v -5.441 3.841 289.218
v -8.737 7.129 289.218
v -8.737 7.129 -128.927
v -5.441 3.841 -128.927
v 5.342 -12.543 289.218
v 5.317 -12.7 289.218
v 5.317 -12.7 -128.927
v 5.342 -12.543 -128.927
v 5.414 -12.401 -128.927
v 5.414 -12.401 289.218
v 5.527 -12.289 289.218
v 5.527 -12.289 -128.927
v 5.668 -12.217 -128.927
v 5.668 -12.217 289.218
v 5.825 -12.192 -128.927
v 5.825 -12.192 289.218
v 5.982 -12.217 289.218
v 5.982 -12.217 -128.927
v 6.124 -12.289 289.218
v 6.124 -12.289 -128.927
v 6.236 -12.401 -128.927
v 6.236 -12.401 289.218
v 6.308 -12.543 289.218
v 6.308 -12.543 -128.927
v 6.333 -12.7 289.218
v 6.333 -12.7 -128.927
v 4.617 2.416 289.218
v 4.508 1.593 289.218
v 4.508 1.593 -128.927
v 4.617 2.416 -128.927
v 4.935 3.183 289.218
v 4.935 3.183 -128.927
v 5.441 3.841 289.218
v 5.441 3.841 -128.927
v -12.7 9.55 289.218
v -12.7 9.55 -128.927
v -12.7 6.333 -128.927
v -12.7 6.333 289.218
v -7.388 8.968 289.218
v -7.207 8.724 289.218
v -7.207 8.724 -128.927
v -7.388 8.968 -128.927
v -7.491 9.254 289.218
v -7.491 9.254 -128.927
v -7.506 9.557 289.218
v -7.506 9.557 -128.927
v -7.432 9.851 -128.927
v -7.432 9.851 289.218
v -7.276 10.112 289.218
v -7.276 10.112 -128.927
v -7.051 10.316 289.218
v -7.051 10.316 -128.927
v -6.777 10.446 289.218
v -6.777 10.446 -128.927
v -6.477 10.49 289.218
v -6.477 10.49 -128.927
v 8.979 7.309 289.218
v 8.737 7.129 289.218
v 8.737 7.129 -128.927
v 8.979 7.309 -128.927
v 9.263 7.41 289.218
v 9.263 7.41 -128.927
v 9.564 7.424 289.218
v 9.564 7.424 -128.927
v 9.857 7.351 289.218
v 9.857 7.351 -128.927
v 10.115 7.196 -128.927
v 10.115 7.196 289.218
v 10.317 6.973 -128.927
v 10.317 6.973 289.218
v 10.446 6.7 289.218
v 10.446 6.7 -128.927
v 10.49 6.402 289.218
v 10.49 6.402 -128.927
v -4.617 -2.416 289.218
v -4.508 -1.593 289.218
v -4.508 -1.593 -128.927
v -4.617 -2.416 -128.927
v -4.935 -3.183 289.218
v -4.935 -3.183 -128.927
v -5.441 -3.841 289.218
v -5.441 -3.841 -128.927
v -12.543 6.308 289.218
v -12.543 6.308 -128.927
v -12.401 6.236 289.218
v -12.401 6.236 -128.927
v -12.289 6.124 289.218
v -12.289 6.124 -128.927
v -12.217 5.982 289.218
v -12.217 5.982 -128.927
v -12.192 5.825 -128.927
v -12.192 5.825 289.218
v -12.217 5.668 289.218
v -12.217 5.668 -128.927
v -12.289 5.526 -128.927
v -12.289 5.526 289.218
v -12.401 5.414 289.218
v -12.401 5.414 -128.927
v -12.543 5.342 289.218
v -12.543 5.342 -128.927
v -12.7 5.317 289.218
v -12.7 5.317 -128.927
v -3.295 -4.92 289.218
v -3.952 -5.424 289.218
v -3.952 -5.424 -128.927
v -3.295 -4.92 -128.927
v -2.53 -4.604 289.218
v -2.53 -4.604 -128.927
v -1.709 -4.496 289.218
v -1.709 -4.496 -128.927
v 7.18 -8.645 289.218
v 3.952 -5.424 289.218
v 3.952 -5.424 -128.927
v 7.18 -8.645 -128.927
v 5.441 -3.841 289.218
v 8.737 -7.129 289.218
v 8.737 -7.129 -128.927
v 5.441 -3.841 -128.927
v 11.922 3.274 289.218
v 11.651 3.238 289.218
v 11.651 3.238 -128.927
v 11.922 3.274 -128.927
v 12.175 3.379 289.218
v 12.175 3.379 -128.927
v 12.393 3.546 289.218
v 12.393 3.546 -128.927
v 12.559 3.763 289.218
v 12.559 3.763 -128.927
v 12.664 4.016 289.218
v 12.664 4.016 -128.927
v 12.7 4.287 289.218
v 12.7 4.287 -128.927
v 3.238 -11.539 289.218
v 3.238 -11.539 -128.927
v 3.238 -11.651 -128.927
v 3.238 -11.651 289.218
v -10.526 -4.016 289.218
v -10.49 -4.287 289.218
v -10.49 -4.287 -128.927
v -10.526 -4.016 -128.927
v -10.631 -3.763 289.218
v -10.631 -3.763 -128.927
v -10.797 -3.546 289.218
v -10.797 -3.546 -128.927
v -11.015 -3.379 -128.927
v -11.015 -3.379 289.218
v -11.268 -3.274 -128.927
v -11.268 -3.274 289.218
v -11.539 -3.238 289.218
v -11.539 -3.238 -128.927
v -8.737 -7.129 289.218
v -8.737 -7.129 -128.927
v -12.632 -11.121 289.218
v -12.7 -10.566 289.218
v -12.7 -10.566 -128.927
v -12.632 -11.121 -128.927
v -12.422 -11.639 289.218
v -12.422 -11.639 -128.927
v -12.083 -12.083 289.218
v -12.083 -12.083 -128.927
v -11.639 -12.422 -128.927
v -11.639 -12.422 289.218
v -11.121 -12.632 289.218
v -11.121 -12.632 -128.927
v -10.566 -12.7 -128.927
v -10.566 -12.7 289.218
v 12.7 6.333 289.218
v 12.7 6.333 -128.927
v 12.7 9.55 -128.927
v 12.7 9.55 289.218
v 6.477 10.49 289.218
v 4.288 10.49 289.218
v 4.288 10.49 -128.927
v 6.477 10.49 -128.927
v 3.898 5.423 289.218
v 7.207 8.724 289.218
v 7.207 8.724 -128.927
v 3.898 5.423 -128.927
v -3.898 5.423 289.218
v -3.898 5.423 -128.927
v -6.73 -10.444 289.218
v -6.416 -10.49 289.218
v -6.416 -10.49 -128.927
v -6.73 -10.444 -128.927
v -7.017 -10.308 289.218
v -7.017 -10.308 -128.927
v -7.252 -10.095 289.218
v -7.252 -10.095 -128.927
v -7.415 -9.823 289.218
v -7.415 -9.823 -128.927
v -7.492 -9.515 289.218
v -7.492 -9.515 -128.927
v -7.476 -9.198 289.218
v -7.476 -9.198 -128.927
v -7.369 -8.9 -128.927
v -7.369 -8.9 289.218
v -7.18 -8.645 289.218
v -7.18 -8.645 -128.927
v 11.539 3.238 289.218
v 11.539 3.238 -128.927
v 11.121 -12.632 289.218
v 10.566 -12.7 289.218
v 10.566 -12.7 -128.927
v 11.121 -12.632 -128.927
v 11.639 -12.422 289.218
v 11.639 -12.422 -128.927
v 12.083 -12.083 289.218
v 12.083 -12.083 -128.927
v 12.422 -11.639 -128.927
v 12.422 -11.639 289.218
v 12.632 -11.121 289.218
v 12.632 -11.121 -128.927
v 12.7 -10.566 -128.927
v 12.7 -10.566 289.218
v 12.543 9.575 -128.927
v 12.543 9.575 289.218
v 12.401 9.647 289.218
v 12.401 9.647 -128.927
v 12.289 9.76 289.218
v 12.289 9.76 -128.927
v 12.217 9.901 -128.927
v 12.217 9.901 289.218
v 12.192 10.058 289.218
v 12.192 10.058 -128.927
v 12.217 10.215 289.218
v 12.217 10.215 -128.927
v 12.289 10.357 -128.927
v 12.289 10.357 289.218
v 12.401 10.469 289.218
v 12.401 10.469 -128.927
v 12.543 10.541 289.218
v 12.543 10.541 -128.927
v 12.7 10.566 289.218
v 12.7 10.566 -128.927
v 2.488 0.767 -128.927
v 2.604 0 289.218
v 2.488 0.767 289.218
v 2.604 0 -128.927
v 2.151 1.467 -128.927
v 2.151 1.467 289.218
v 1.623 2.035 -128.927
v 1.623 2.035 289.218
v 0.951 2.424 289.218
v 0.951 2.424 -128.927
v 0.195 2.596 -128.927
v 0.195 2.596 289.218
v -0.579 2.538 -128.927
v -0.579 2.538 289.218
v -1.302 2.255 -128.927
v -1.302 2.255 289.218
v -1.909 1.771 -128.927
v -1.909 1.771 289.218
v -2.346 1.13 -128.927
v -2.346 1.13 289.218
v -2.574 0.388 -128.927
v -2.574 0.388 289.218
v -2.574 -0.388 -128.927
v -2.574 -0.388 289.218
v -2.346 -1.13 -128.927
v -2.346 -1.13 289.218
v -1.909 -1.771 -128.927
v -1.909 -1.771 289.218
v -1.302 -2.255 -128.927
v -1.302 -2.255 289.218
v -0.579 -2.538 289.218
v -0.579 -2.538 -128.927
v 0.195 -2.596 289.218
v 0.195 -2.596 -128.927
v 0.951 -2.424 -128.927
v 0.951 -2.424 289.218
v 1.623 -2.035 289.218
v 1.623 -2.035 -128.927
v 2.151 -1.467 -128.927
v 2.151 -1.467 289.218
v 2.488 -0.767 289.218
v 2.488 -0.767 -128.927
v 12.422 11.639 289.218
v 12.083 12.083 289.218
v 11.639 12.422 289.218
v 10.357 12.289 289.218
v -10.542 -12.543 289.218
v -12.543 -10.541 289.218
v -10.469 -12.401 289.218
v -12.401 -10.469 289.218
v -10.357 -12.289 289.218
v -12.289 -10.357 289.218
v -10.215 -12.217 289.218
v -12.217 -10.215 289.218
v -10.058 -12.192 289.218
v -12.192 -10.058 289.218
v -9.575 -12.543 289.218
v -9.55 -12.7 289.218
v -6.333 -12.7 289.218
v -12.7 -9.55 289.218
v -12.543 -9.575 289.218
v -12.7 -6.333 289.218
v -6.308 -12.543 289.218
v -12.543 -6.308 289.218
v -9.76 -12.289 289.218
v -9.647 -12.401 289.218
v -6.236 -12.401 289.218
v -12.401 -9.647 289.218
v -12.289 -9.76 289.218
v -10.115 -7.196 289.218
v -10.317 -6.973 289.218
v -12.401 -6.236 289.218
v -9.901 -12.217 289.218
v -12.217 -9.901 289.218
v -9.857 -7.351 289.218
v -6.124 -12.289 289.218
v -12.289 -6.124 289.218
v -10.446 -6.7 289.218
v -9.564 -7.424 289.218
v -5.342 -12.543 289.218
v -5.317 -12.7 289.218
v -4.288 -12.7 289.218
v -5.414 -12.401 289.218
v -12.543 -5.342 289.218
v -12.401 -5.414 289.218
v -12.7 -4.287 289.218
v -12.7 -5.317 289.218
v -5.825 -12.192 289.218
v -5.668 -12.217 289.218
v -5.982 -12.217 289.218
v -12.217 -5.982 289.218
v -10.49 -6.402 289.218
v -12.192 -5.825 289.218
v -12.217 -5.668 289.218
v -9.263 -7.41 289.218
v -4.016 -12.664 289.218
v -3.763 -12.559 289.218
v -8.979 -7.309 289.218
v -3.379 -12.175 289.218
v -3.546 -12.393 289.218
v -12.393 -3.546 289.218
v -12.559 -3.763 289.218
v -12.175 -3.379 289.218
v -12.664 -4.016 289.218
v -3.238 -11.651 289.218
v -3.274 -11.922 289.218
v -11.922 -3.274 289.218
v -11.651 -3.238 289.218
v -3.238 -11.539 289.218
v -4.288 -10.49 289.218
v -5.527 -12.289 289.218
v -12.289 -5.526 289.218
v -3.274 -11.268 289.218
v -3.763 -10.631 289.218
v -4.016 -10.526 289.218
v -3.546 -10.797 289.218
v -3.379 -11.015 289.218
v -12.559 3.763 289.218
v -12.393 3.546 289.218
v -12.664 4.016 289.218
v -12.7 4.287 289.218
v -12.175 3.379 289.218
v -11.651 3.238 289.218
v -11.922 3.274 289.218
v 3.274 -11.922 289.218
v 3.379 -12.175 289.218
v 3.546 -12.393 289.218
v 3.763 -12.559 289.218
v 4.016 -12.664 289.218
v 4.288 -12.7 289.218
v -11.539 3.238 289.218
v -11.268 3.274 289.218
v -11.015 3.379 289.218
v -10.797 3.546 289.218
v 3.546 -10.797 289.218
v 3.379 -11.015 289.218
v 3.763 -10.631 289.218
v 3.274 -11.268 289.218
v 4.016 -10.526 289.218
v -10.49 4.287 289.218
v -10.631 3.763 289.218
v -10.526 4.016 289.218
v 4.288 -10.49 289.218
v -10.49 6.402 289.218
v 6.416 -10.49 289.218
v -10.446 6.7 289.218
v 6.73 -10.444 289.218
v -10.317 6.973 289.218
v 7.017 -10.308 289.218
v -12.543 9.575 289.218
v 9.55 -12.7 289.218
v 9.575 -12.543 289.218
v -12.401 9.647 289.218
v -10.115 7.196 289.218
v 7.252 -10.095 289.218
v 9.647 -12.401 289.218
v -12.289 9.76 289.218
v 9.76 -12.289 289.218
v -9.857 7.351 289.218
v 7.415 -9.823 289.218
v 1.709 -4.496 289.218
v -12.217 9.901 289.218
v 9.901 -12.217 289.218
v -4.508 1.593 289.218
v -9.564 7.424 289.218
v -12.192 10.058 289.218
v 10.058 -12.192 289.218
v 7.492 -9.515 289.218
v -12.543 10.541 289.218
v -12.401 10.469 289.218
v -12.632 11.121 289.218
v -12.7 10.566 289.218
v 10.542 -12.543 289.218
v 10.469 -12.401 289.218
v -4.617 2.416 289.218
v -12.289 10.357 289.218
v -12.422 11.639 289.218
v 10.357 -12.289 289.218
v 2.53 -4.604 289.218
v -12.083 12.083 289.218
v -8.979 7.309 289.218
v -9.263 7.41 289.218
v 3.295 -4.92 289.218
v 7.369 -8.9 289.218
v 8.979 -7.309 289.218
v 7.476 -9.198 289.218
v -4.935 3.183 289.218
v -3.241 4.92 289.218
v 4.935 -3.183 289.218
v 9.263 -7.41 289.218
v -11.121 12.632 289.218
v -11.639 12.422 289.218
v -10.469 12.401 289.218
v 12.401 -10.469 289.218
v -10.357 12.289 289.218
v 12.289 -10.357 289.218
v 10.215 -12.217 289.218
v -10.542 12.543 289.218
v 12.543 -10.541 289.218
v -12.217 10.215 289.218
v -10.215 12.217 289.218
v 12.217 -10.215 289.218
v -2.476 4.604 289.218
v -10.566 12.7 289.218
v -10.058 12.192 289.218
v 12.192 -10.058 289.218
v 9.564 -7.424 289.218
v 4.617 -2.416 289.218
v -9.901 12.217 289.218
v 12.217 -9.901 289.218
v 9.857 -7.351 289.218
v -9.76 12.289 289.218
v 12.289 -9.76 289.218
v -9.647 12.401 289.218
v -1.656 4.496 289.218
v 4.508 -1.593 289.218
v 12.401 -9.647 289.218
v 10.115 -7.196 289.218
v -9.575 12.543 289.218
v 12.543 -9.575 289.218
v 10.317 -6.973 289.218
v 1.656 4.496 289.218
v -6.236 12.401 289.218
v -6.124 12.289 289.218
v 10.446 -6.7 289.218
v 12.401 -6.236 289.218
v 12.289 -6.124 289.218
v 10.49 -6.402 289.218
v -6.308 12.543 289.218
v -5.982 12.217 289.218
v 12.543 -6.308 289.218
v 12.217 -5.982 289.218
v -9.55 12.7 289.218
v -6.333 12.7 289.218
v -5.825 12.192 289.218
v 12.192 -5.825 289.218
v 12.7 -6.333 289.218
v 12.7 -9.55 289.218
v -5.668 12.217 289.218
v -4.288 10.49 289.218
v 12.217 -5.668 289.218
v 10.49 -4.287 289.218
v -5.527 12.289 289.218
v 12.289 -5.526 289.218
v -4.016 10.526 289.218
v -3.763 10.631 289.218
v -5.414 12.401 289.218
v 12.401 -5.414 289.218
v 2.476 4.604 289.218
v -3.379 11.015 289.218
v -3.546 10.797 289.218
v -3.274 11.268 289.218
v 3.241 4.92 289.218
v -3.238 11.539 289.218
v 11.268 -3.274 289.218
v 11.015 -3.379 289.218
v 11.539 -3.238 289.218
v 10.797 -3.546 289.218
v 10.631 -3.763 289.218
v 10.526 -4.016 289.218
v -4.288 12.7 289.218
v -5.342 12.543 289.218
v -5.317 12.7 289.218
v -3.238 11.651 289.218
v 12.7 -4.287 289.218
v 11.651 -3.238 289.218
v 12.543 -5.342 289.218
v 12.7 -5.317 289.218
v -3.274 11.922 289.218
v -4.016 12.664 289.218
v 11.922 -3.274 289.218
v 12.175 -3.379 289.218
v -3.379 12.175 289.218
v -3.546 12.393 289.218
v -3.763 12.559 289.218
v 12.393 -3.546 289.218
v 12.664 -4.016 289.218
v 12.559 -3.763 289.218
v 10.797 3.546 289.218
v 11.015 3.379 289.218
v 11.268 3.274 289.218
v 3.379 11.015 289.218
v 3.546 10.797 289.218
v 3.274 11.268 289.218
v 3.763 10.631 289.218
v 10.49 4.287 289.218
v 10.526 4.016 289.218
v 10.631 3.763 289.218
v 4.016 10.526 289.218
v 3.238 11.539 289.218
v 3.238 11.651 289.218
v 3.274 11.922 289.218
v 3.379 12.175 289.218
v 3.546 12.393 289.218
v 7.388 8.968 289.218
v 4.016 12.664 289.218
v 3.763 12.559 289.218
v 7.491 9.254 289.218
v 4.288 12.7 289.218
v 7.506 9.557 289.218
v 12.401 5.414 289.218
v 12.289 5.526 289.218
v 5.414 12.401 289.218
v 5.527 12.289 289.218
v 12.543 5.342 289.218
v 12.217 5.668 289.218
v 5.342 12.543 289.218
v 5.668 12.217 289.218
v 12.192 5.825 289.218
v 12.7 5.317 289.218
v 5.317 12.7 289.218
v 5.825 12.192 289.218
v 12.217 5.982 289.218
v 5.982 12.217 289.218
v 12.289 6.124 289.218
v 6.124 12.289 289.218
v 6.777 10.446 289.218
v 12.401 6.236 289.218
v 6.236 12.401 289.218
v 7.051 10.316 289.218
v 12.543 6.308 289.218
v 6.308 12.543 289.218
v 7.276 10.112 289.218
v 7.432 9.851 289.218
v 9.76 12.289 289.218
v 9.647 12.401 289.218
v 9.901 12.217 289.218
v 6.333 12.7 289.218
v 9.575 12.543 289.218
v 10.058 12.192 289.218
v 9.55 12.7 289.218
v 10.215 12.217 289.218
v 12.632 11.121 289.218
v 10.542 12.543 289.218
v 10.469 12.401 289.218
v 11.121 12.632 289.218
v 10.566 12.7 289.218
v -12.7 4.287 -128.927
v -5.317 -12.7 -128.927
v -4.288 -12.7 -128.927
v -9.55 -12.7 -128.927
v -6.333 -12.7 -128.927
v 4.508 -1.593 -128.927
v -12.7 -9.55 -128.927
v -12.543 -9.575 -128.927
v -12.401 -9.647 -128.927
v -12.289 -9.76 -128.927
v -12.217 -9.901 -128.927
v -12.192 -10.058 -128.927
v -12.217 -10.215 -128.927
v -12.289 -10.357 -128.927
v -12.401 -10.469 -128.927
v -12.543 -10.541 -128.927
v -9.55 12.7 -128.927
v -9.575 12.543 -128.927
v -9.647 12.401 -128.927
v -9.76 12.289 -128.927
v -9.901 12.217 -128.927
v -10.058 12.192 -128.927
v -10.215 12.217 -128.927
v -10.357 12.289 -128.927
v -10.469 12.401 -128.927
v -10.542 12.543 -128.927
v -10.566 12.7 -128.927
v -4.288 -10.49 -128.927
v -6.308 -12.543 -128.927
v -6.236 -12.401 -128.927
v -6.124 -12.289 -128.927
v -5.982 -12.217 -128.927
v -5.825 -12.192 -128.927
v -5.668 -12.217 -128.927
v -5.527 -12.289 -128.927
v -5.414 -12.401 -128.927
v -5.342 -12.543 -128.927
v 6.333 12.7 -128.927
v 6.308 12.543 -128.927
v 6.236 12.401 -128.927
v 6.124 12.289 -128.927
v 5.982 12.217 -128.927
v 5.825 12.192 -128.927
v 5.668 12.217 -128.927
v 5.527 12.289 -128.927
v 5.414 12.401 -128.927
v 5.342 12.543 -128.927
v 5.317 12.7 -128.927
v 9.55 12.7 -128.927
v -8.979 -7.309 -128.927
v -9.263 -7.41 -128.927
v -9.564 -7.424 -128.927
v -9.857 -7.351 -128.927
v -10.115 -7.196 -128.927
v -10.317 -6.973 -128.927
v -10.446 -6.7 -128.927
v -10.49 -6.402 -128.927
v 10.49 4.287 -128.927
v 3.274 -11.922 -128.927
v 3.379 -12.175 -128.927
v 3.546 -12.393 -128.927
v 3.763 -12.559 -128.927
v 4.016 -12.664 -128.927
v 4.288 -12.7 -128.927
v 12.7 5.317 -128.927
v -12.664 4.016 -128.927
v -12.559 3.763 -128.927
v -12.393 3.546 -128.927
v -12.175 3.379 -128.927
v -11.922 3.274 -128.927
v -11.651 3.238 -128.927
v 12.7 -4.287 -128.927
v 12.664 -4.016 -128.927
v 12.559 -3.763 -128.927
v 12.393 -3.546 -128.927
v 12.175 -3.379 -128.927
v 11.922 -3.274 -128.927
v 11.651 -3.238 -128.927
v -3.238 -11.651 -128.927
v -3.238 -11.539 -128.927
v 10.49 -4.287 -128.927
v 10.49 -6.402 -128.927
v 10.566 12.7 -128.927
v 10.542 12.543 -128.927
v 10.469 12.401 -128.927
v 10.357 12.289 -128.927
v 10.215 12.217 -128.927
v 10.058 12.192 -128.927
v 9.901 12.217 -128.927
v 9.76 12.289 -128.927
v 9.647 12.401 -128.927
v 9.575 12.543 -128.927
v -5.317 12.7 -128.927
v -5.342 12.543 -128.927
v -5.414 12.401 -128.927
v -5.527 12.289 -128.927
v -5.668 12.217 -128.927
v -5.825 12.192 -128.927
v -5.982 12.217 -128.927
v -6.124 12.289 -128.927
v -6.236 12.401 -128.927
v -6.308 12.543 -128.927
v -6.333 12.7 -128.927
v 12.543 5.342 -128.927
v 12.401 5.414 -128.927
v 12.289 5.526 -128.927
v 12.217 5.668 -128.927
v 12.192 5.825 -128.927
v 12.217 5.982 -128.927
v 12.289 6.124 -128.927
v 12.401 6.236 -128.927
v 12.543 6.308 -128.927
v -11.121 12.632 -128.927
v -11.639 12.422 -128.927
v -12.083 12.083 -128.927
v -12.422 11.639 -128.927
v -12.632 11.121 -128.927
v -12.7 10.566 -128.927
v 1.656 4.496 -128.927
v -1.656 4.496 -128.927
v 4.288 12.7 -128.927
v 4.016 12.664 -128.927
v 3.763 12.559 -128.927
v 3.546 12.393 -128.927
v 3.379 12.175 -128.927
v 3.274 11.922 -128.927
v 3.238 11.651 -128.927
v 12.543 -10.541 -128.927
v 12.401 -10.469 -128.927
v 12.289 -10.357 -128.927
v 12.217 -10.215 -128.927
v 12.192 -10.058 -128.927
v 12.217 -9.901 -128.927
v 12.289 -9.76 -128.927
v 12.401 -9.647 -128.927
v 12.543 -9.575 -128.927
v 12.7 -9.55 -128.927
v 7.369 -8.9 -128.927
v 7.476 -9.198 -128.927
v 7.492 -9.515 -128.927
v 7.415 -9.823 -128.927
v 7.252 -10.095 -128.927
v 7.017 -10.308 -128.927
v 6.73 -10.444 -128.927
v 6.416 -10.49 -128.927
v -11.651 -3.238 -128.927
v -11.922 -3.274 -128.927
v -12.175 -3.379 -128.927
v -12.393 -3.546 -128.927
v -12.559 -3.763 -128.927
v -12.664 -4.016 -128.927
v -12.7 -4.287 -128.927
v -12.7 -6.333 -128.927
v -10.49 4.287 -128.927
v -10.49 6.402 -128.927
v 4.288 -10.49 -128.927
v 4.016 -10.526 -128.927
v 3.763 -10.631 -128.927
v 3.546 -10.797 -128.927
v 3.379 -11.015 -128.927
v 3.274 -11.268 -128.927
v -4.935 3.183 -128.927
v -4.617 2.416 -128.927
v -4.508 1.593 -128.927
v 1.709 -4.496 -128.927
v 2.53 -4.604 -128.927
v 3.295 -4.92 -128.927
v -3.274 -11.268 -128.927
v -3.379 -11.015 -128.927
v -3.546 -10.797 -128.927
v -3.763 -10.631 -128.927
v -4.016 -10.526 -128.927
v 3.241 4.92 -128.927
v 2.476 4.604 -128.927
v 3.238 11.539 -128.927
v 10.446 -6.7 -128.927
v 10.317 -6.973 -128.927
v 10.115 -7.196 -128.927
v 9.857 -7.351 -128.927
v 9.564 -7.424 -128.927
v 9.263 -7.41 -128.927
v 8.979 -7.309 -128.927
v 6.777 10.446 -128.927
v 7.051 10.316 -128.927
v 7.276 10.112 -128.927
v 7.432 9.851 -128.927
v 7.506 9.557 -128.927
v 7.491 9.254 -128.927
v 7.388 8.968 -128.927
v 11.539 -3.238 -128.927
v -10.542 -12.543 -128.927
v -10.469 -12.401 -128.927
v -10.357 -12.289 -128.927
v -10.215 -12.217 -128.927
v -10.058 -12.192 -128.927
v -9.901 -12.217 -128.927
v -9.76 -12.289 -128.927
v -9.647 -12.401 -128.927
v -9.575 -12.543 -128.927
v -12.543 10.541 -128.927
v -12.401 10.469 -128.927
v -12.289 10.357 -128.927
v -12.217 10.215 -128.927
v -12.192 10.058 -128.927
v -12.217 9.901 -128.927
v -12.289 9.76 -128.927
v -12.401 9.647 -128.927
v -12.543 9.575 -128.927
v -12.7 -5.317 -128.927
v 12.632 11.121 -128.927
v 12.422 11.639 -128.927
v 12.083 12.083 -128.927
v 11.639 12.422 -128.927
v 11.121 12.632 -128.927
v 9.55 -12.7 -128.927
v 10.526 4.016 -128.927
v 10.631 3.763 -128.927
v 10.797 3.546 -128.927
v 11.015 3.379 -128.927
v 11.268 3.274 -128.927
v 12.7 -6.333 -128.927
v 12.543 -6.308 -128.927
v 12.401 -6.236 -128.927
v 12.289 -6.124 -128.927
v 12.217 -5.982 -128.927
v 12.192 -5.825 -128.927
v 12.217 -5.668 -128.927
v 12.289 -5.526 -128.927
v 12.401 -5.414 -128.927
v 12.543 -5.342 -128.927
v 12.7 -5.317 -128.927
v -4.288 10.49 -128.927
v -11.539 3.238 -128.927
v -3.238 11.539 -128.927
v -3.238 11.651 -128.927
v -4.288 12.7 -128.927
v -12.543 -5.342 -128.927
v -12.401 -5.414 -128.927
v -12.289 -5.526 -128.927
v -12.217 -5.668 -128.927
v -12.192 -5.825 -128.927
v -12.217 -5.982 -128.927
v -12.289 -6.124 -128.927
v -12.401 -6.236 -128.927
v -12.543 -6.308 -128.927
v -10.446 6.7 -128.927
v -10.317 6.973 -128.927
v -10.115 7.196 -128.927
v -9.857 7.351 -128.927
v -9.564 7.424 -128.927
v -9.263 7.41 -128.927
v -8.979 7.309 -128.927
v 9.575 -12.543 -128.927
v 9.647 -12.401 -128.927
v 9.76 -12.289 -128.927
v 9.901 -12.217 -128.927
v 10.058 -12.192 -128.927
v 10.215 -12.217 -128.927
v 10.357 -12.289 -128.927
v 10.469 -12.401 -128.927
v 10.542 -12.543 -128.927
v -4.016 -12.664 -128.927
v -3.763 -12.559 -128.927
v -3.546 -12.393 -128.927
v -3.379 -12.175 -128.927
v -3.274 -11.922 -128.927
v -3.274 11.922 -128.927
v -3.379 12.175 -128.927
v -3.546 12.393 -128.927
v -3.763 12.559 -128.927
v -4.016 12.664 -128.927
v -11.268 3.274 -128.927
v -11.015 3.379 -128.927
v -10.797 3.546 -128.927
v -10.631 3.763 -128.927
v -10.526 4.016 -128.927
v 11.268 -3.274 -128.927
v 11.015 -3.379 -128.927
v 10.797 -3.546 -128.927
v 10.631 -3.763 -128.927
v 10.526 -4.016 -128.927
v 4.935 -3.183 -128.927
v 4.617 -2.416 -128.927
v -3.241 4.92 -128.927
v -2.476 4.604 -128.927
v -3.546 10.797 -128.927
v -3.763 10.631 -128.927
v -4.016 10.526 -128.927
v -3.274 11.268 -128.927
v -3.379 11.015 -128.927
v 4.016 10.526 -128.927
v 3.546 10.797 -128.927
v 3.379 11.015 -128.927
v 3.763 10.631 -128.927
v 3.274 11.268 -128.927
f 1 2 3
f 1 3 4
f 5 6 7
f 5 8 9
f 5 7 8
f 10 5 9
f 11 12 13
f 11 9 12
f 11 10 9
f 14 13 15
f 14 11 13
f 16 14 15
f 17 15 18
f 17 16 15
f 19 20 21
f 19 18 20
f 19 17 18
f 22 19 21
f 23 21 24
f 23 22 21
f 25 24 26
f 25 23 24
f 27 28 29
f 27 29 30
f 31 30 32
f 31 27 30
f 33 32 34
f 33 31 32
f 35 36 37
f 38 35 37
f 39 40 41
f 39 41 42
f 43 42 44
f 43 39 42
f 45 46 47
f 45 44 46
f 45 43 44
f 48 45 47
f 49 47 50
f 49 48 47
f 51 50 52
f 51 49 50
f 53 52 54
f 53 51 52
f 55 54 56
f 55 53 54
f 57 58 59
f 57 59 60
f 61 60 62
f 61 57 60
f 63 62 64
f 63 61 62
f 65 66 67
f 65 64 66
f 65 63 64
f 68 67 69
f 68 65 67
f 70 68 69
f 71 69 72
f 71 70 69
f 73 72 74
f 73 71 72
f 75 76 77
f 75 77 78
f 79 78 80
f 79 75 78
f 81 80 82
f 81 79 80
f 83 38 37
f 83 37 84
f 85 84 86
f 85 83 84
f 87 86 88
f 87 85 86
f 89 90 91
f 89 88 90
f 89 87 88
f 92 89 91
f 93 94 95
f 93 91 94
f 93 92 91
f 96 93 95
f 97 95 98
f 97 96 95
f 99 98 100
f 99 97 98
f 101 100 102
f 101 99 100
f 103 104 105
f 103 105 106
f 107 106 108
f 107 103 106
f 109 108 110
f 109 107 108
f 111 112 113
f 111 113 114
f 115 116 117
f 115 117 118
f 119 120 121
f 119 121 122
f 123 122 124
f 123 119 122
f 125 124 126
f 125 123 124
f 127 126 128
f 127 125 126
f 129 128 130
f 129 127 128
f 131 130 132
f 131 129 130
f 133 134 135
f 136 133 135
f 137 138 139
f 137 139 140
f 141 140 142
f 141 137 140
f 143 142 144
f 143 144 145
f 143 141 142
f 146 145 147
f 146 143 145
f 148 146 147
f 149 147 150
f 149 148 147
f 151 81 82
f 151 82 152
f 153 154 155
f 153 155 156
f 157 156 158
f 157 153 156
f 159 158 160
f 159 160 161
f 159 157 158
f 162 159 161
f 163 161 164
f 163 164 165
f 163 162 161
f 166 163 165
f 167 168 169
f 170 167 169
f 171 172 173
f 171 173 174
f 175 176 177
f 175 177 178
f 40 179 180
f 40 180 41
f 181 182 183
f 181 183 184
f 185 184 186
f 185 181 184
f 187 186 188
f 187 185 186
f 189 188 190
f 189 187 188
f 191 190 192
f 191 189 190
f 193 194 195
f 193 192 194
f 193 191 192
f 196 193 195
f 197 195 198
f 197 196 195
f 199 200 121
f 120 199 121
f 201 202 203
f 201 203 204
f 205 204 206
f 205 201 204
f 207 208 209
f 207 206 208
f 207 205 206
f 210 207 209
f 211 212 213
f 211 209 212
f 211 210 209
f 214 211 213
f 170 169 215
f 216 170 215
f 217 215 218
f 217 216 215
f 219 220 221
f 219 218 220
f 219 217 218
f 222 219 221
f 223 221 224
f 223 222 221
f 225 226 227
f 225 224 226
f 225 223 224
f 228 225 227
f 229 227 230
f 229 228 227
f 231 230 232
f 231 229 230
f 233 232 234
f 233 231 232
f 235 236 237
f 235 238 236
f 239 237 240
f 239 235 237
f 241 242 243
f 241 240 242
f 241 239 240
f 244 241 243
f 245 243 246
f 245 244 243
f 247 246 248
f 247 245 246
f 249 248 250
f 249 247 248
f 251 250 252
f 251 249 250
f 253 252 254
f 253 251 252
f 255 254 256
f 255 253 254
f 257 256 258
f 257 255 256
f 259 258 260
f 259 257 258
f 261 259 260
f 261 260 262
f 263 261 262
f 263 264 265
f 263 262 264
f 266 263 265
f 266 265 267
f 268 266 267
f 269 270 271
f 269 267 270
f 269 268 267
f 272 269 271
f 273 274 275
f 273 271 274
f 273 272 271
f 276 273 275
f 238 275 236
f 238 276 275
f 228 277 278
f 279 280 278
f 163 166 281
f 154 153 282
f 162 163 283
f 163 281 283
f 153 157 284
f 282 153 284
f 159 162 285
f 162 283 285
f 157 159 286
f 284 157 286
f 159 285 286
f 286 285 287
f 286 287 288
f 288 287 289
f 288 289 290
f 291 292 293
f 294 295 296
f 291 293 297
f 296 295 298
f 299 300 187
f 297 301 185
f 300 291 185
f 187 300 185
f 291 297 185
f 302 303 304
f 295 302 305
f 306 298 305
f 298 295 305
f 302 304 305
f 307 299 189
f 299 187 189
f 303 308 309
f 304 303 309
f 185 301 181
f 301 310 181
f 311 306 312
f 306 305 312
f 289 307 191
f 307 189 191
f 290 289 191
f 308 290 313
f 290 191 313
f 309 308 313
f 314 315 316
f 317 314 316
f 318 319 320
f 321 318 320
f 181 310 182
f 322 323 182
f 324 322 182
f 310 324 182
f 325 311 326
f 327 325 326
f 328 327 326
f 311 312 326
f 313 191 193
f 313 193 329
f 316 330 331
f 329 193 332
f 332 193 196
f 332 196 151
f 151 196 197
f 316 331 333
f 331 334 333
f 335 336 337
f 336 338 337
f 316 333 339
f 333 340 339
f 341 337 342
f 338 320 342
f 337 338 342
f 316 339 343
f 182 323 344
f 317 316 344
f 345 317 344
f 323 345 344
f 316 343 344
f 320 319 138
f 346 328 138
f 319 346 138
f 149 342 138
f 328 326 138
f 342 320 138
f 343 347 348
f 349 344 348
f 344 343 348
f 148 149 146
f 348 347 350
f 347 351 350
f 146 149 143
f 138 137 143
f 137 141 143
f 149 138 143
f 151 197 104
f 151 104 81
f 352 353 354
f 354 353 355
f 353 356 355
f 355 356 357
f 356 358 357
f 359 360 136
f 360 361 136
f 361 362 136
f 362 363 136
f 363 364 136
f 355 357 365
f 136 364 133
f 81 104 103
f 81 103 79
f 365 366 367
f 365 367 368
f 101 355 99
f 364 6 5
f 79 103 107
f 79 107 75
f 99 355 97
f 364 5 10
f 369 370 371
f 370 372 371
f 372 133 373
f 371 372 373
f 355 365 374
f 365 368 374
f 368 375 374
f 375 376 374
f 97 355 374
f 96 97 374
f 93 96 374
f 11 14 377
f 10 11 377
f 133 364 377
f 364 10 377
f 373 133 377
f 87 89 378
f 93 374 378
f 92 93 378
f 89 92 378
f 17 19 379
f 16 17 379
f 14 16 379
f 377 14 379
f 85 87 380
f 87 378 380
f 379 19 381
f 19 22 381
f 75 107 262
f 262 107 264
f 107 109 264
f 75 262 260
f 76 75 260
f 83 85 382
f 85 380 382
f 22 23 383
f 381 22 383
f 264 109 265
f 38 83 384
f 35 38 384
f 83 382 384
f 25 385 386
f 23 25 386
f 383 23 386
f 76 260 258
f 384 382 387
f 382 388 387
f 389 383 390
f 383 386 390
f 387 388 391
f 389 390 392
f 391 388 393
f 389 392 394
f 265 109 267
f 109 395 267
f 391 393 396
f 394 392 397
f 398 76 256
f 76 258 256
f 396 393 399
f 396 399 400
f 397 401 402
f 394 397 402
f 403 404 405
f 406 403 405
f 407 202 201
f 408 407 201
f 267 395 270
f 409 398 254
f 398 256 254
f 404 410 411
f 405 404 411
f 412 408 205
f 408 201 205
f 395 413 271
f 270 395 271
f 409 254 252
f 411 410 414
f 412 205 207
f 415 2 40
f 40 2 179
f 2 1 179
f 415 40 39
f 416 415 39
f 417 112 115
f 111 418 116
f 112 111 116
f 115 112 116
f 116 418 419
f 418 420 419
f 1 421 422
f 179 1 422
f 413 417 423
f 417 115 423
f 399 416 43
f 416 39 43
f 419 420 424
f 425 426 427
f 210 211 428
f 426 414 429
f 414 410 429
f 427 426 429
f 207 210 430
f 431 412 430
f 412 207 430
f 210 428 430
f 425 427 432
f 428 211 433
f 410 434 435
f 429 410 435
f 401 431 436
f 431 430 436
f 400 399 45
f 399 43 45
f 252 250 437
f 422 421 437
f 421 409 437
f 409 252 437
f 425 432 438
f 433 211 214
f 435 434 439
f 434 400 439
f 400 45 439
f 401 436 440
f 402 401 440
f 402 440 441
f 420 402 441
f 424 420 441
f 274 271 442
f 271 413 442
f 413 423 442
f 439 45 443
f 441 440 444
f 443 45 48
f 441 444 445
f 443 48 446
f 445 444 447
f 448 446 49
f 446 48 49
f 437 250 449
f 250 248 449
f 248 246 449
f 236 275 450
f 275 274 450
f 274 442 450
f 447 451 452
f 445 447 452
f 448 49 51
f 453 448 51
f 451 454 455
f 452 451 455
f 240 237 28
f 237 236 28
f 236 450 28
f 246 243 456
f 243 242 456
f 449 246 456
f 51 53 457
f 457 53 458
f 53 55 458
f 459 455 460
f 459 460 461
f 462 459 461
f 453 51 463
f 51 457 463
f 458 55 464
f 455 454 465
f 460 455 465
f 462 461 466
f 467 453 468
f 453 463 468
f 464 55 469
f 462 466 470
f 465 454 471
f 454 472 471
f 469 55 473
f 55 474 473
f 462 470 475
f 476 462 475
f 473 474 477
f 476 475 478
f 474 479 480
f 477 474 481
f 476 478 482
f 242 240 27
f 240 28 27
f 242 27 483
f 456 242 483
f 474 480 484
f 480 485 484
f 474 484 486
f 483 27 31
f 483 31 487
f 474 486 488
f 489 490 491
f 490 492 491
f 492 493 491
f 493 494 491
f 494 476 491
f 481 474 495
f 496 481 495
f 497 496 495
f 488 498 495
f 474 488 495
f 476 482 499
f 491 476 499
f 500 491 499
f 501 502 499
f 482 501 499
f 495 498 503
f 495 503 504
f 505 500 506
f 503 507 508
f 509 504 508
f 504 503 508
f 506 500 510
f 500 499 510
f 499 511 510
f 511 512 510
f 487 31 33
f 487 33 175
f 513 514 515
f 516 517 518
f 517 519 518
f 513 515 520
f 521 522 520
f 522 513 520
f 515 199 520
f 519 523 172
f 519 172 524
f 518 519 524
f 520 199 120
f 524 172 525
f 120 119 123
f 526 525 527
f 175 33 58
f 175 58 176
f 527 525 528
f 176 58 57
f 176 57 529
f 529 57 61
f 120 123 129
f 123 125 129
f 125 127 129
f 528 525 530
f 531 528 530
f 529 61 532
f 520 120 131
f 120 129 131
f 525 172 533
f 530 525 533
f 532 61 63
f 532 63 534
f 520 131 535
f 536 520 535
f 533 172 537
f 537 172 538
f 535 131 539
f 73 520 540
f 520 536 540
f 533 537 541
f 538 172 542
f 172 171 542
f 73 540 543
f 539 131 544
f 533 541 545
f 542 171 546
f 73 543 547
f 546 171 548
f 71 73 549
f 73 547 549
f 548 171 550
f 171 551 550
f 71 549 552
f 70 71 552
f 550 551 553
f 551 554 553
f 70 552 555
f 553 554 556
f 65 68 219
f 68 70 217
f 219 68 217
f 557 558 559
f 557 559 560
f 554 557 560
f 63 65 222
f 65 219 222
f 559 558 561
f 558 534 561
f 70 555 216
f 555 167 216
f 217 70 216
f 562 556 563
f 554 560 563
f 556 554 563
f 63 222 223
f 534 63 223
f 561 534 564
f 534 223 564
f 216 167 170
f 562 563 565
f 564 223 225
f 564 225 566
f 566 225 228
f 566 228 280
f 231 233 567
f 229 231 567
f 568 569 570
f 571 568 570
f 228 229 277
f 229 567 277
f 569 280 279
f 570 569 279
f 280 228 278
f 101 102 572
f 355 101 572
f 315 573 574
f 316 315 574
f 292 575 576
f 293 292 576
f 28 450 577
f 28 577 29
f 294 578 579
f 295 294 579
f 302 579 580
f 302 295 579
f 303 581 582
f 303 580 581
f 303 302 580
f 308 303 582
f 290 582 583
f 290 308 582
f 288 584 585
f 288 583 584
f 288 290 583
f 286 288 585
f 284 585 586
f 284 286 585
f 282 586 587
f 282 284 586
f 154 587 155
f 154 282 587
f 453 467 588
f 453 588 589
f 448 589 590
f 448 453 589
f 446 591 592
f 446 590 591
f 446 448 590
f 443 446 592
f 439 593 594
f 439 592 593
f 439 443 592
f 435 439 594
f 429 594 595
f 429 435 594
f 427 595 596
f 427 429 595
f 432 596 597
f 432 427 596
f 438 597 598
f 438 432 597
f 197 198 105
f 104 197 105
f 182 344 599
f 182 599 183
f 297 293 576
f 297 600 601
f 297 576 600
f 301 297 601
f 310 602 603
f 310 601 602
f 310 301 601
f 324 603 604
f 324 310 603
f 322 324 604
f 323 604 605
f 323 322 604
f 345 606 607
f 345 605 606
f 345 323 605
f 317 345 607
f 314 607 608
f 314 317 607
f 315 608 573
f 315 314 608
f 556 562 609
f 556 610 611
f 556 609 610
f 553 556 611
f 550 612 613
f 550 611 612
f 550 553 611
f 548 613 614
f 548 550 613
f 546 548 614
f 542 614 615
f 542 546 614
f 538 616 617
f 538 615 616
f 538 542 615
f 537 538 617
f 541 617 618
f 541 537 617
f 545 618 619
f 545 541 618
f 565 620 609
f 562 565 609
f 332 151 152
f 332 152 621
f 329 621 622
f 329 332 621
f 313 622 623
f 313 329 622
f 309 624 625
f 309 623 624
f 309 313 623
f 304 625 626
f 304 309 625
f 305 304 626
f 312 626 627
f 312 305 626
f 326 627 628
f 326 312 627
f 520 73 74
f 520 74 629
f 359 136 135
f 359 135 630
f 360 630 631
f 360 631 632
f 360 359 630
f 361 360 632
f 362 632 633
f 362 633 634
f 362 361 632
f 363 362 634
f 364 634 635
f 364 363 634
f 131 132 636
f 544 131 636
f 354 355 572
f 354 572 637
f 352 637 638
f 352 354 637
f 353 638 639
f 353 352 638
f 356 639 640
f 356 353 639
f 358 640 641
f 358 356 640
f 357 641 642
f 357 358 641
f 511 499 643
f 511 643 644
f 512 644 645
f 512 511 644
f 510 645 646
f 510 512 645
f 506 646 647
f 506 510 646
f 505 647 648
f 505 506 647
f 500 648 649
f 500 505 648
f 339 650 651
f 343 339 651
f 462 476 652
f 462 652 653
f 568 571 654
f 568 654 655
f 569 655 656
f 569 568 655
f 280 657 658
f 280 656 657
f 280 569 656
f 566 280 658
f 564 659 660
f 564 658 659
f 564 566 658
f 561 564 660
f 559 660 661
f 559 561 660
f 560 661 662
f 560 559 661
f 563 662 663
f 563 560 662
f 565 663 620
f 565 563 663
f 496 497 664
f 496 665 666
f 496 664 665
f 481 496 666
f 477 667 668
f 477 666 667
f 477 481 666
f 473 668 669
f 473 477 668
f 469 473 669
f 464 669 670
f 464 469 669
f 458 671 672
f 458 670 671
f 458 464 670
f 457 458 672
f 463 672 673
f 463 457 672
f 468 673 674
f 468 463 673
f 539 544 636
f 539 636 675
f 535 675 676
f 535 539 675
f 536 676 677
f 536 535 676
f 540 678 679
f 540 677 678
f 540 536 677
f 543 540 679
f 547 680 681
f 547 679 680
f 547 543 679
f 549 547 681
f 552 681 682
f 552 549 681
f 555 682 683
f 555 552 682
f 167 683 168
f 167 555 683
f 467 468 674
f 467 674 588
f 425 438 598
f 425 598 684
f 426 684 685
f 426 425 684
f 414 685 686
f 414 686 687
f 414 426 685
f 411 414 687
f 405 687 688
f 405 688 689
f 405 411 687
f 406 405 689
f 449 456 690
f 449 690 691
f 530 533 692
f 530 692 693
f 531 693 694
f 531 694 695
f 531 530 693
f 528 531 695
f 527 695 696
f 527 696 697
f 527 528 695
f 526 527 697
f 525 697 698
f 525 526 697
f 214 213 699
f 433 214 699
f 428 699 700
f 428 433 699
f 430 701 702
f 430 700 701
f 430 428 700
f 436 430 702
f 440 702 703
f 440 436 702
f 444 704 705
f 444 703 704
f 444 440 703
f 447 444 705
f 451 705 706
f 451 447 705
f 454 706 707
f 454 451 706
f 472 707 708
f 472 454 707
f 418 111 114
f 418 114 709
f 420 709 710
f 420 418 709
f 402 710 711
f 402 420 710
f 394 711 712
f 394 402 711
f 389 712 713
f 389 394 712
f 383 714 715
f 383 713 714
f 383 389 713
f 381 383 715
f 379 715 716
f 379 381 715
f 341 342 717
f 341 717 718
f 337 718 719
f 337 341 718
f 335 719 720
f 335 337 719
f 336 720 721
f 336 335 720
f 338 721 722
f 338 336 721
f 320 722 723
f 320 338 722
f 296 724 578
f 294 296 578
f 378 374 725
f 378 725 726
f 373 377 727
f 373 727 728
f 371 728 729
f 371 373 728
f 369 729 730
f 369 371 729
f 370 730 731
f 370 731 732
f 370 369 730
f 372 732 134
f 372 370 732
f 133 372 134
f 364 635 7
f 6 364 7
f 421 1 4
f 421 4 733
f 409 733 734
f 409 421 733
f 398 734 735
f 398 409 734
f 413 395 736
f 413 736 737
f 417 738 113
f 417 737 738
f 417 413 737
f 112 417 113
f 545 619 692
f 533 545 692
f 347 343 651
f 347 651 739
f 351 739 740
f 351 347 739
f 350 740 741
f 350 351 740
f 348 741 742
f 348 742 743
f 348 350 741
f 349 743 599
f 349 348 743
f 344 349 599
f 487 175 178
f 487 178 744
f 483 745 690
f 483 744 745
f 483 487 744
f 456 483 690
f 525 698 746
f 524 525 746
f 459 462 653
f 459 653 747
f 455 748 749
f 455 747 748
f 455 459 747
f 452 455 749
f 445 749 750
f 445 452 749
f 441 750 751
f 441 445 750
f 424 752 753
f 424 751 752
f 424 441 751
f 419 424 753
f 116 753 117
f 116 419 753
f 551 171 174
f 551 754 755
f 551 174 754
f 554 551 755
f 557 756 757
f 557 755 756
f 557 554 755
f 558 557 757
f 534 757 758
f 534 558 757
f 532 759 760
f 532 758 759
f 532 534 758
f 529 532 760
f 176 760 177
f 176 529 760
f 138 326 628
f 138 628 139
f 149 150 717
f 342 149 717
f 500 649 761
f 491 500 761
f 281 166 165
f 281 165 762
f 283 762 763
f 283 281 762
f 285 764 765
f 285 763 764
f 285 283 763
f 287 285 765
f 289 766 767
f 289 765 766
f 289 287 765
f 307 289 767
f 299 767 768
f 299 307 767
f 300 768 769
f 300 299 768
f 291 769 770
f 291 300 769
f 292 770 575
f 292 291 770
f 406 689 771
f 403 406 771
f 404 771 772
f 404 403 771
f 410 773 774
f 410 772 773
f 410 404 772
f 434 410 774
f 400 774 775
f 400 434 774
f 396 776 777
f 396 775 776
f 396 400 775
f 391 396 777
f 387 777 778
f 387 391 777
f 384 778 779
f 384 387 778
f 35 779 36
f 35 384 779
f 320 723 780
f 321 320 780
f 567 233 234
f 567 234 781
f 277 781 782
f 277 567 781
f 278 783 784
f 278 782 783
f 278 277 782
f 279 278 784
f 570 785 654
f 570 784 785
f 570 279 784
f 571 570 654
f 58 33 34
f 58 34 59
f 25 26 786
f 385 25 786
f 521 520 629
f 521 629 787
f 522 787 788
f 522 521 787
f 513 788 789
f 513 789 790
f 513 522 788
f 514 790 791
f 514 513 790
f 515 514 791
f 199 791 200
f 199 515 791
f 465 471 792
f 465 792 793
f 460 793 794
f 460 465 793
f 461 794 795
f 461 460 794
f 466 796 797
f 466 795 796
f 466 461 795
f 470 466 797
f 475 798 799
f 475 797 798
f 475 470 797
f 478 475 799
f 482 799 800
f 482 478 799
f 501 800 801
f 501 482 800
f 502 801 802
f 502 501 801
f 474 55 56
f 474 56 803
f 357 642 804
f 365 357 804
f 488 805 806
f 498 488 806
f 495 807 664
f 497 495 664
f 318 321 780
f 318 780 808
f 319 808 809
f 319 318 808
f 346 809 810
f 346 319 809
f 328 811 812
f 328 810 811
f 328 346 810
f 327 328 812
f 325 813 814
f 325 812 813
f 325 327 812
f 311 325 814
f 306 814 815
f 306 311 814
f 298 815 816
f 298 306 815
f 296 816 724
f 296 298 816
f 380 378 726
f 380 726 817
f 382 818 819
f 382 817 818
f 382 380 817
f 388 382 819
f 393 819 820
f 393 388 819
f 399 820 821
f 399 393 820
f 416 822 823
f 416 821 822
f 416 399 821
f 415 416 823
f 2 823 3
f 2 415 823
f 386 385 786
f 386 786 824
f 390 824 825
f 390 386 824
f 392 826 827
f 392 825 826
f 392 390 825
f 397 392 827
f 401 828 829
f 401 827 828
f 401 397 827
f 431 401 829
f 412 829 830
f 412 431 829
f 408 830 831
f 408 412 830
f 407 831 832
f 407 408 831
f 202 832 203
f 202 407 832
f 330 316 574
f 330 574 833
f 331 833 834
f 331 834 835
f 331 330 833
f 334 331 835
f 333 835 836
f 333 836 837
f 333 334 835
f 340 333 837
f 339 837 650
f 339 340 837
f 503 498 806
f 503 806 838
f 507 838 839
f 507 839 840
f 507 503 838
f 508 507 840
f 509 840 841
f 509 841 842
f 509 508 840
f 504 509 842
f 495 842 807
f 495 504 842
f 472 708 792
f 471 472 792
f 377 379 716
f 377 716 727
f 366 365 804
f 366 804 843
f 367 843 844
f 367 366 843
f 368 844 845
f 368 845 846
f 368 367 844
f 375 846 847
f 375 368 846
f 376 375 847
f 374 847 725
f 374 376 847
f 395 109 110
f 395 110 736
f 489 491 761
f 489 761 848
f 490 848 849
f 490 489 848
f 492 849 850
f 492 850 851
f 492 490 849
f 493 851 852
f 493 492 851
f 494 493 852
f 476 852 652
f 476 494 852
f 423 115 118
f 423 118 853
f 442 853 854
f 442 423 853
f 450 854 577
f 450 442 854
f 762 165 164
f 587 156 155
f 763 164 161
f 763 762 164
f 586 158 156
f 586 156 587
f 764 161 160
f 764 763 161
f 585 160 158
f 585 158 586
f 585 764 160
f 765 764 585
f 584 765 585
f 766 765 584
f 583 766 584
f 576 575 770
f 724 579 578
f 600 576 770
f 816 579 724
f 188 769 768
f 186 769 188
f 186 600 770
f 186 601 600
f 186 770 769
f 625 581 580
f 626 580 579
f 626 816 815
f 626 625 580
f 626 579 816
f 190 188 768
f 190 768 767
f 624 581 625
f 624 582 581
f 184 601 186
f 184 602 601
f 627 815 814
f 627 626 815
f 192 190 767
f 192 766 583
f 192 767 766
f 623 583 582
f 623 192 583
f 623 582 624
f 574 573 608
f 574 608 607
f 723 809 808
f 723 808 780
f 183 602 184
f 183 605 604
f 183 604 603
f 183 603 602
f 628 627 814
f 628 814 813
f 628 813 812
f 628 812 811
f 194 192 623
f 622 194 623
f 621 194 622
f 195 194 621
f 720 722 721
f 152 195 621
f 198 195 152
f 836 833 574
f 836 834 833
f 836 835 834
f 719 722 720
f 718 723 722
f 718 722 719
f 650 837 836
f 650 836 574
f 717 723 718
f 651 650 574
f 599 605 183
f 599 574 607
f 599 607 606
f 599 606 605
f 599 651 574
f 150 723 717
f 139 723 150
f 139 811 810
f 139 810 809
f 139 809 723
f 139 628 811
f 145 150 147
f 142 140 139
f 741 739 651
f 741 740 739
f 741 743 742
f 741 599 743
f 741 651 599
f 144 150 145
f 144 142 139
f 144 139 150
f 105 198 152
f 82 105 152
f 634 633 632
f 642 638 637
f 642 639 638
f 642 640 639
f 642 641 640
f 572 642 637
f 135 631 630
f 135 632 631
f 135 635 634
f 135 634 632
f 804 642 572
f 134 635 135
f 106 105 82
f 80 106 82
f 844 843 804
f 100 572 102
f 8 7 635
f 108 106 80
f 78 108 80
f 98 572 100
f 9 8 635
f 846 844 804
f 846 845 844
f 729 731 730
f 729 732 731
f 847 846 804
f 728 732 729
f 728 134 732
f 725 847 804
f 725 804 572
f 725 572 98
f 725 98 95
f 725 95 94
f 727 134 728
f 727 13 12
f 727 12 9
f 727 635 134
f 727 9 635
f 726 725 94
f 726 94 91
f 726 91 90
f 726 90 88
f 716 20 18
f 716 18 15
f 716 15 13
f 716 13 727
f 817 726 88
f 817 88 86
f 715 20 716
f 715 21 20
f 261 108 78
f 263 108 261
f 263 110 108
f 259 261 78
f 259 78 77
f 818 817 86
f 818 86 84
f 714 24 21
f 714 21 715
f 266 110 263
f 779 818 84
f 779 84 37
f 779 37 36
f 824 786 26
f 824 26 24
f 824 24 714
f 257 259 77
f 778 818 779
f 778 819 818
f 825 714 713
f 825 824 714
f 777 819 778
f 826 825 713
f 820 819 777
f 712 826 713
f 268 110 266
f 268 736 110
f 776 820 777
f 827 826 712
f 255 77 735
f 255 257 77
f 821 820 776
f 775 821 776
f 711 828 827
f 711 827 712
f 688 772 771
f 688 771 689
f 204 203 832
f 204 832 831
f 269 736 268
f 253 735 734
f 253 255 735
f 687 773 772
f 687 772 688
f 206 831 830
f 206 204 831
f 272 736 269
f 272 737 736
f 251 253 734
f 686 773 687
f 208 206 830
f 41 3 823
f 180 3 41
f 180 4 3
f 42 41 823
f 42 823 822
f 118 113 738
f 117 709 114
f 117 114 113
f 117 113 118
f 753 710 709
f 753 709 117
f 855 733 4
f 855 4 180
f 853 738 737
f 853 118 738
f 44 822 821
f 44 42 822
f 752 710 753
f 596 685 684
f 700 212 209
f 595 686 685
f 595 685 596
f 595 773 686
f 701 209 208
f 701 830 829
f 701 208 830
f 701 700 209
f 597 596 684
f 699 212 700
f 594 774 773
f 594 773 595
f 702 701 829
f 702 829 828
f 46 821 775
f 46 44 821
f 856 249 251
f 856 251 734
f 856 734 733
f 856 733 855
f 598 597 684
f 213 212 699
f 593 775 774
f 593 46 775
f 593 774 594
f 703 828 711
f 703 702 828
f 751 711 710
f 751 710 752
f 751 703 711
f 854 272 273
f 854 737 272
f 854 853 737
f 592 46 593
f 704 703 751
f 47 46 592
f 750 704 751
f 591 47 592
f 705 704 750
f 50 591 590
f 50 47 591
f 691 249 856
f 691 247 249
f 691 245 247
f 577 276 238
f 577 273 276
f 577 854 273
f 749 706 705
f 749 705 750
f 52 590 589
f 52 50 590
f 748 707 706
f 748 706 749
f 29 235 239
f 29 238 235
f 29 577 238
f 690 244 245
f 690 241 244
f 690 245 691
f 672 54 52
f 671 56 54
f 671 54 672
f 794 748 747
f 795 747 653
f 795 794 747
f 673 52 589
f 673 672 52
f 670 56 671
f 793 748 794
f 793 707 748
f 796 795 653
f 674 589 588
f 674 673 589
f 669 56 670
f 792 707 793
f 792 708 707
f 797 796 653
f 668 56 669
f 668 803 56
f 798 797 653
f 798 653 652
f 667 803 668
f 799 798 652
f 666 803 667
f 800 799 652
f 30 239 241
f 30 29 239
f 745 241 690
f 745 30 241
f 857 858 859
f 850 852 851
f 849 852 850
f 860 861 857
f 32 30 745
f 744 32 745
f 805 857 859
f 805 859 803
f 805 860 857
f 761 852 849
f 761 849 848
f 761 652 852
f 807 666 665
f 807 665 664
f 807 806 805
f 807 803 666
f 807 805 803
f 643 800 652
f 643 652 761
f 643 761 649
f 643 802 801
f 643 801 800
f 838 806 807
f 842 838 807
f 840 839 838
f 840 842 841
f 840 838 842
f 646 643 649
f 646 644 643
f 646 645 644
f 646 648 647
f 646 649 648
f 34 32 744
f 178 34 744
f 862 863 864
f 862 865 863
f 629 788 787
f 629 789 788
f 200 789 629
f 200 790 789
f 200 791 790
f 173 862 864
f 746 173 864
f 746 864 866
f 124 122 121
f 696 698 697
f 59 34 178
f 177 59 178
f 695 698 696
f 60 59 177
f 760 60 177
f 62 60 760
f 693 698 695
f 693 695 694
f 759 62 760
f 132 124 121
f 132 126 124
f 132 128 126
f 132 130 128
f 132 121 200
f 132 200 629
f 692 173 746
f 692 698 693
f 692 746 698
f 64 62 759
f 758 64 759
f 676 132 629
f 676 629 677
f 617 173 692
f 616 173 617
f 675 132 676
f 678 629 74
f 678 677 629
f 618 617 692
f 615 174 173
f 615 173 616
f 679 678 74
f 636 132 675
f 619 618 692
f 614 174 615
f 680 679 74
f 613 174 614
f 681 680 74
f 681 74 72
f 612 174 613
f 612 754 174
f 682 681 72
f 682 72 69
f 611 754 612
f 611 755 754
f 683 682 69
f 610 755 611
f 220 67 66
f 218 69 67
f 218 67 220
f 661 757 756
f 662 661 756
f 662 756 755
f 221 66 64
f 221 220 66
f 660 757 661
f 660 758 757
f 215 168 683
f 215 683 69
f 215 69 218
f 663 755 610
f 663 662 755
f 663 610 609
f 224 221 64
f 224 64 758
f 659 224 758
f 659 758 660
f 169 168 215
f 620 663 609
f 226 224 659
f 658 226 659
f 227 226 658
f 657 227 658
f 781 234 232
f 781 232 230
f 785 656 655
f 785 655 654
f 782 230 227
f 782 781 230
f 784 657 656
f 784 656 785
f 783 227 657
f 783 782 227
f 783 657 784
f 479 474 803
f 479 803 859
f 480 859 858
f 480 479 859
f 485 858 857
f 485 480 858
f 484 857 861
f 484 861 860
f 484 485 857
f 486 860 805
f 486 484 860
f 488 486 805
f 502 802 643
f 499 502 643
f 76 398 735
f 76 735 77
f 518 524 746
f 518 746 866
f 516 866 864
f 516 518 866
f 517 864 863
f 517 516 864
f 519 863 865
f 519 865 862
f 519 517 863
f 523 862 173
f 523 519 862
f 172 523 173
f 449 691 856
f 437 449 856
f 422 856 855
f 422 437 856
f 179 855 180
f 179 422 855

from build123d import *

# Parameters (mm, degrees)
SKETCH1_R               = 2.6035
BOSS_EXTRUDE1_DEPTH     = 304.8
SKETCH2_W               = 181.816409497
SKETCH2_H               = 28.139832977
SKETCH2_W_2             = 16.257599062
SKETCH2_H_2             = 27.586789262
CUT_EXTRUDE1_DEPTH      = 1.778
CUT_EXTRUDE1_DEPTH_BACK = 26.162


with BuildPart() as part:
    # Sketch1 → Boss-Extrude1 (new body, symmetric)
    with BuildSketch(Plane.XY):
        with BuildLine():
            Line((-7.179650497, -8.645192506), (-3.952270251, -5.423690499))
            ThreePointArc((-3.952270251, -5.423690499), (-2.922936451, -4.736929036), (-1.709253557, -4.4958))
            Line((-1.709253557, -4.4958), (1.709253557, -4.4958))
            ThreePointArc((1.709253557, -4.4958), (2.922936451, -4.736929036), (3.952270251, -5.423690499))
            Line((3.952270251, -5.423690499), (7.179650497, -8.645192506))
            ThreePointArc((7.179650497, -8.645192506), (7.41473083, -9.822813117), (6.416408329, -10.4902))
            Line((6.416408329, -10.4902), (4.287512407, -10.4902))
            ThreePointArc((4.287512407, -10.4902), (3.54574862, -10.79744862), (3.2385, -11.539212407))
            Line((3.2385, -11.539212407), (3.2385, -11.650987593))
            ThreePointArc((3.2385, -11.650987593), (3.54574862, -12.39275138), (4.287512407, -12.7))
            Line((4.287512407, -12.7), (5.317126718, -12.7))
            ThreePointArc((5.317126718, -12.7), (5.825126718, -12.192), (6.333126718, -12.7))
            Line((6.333126718, -12.7), (9.550443118, -12.7))
            ThreePointArc((9.550443118, -12.7), (10.058366869, -12.192000006), (10.566443095, -12.699847501))
            ThreePointArc((10.566443095, -12.699847501), (12.082537762, -12.08250727), (12.699846982, -10.566399977))
            ThreePointArc((12.699846982, -10.566399977), (12.192000006, -10.058323491), (12.7, -9.5504))
            Line((12.7, -9.5504), (12.7, -6.3330836))
            ThreePointArc((12.7, -6.3330836), (12.192, -5.8250836), (12.7, -5.3170836))
            Line((12.7, -5.3170836), (12.7, -4.287469289))
            ThreePointArc((12.7, -4.287469289), (12.39275138, -3.545705502), (11.650987593, -3.238456882))
            Line((11.650987593, -3.238456882), (11.539212407, -3.238456882))
            ThreePointArc((11.539212407, -3.238456882), (10.79744862, -3.545705502), (10.4902, -4.287469289))
            Line((10.4902, -4.287469289), (10.4902, -6.402089023))
            ThreePointArc((10.4902, -6.402089023), (9.856505071, -7.351067942), (8.737131347, -7.129408934))
            Line((8.737131347, -7.129408934), (5.441005833, -3.840816462))
            ThreePointArc((5.441005833, -3.840816462), (4.750877967, -2.809883091), (4.5085, -1.593185507))
            Line((4.5085, -1.593185507), (4.5085, 1.593185507))
            ThreePointArc((4.5085, 1.593185507), (4.750877967, 2.809883091), (5.441005833, 3.840816462))
            Line((5.441005833, 3.840816462), (8.737131347, 7.129408934))
            ThreePointArc((8.737131347, 7.129408934), (9.856505071, 7.351067942), (10.4902, 6.402089023))
            Line((10.4902, 6.402089023), (10.4902, 4.287469289))
            ThreePointArc((10.4902, 4.287469289), (10.79744862, 3.545705502), (11.539212407, 3.238456882))
            Line((11.539212407, 3.238456882), (11.650987593, 3.238456882))
            ThreePointArc((11.650987593, 3.238456882), (12.39275138, 3.545705502), (12.7, 4.287469289))
            Line((12.7, 4.287469289), (12.7, 5.3170836))
            ThreePointArc((12.7, 5.3170836), (12.192, 5.8250836), (12.7, 6.3330836))
            Line((12.7, 6.3330836), (12.7, 9.5504))
            ThreePointArc((12.7, 9.5504), (12.192000006, 10.058323491), (12.699846982, 10.566399977))
            ThreePointArc((12.699846982, 10.566399977), (12.082537762, 12.08250727), (10.566443095, 12.699847501))
            ThreePointArc((10.566443095, 12.699847501), (10.058366869, 12.192000006), (9.550443118, 12.7))
            Line((9.550443118, 12.7), (6.333126718, 12.7))
            ThreePointArc((6.333126718, 12.7), (5.825126718, 12.192), (5.317126718, 12.7))
            Line((5.317126718, 12.7), (4.287512407, 12.7))
            ThreePointArc((4.287512407, 12.7), (3.54574862, 12.39275138), (3.2385, 11.650987593))
            Line((3.2385, 11.650987593), (3.2385, 11.539212407))
            ThreePointArc((3.2385, 11.539212407), (3.54574862, 10.79744862), (4.287512407, 10.4902))
            Line((4.287512407, 10.4902), (6.476788598, 10.4902))
            ThreePointArc((6.476788598, 10.4902), (7.432222385, 9.85140422), (7.207036008, 8.724370562))
            Line((7.207036008, 8.724370562), (3.898272566, 5.423169045))
            ThreePointArc((3.898272566, 5.423169045), (2.869120213, 4.736787962), (1.655778399, 4.4958))
            Line((1.655778399, 4.4958), (-1.655778399, 4.4958))
            ThreePointArc((-1.655778399, 4.4958), (-2.869120213, 4.736787962), (-3.898272566, 5.423169045))
            Line((-3.898272566, 5.423169045), (-7.207036008, 8.724370562))
            ThreePointArc((-7.207036008, 8.724370562), (-7.432222385, 9.85140422), (-6.476788598, 10.4902))
            Line((-6.476788598, 10.4902), (-4.287512407, 10.4902))
            ThreePointArc((-4.287512407, 10.4902), (-3.54574862, 10.79744862), (-3.2385, 11.539212407))
            Line((-3.2385, 11.539212407), (-3.2385, 11.650987593))
            ThreePointArc((-3.2385, 11.650987593), (-3.54574862, 12.39275138), (-4.287512407, 12.7))
            Line((-4.287512407, 12.7), (-5.317126718, 12.7))
            ThreePointArc((-5.317126718, 12.7), (-5.825126718, 12.192), (-6.333126718, 12.7))
            Line((-6.333126718, 12.7), (-9.550443118, 12.7))
            ThreePointArc((-9.550443118, 12.7), (-10.058366869, 12.192000006), (-10.566443095, 12.699847501))
            ThreePointArc((-10.566443095, 12.699847501), (-12.082537762, 12.08250727), (-12.699846982, 10.566399977))
            ThreePointArc((-12.699846982, 10.566399977), (-12.192000006, 10.058323491), (-12.7, 9.5504))
            Line((-12.7, 9.5504), (-12.7, 6.3330836))
            ThreePointArc((-12.7, 6.3330836), (-12.192, 5.8250836), (-12.7, 5.3170836))
            Line((-12.7, 5.3170836), (-12.7, 4.287469289))
            ThreePointArc((-12.7, 4.287469289), (-12.39275138, 3.545705502), (-11.650987593, 3.238456882))
            Line((-11.650987593, 3.238456882), (-11.539212407, 3.238456882))
            ThreePointArc((-11.539212407, 3.238456882), (-10.79744862, 3.545705502), (-10.4902, 4.287469289))
            Line((-10.4902, 4.287469289), (-10.4902, 6.402089023))
            ThreePointArc((-10.4902, 6.402089023), (-9.856505071, 7.351067942), (-8.737131347, 7.129408934))
            Line((-8.737131347, 7.129408934), (-5.441005833, 3.840816462))
            ThreePointArc((-5.441005833, 3.840816462), (-4.750877967, 2.809883091), (-4.5085, 1.593185507))
            Line((-4.5085, 1.593185507), (-4.5085, -1.593185507))
            ThreePointArc((-4.5085, -1.593185507), (-4.750877967, -2.809883091), (-5.441005833, -3.840816462))
            Line((-5.441005833, -3.840816462), (-8.737131347, -7.129408934))
            ThreePointArc((-8.737131347, -7.129408934), (-9.856505071, -7.351067942), (-10.4902, -6.402089023))
            Line((-10.4902, -6.402089023), (-10.4902, -4.287469289))
            ThreePointArc((-10.4902, -4.287469289), (-10.79744862, -3.545705502), (-11.539212407, -3.238456882))
            Line((-11.539212407, -3.238456882), (-11.650987593, -3.238456882))
            ThreePointArc((-11.650987593, -3.238456882), (-12.39275138, -3.545705502), (-12.7, -4.287469289))
            Line((-12.7, -4.287469289), (-12.7, -5.3170836))
            ThreePointArc((-12.7, -5.3170836), (-12.192, -5.8250836), (-12.7, -6.3330836))
            Line((-12.7, -6.3330836), (-12.7, -9.5504))
            ThreePointArc((-12.7, -9.5504), (-12.192000006, -10.058323491), (-12.699846982, -10.566399977))
            ThreePointArc((-12.699846982, -10.566399977), (-12.082537762, -12.08250727), (-10.566443095, -12.699847501))
            ThreePointArc((-10.566443095, -12.699847501), (-10.058366869, -12.192000006), (-9.550443118, -12.7))
            Line((-9.550443118, -12.7), (-6.333126718, -12.7))
            ThreePointArc((-6.333126718, -12.7), (-5.825126718, -12.192), (-5.317126718, -12.7))
            Line((-5.317126718, -12.7), (-4.287512407, -12.7))
            ThreePointArc((-4.287512407, -12.7), (-3.54574862, -12.39275138), (-3.2385, -11.650987593))
            Line((-3.2385, -11.650987593), (-3.2385, -11.539212407))
            ThreePointArc((-3.2385, -11.539212407), (-3.54574862, -10.79744862), (-4.287512407, -10.4902))
            Line((-4.287512407, -10.4902), (-6.416408329, -10.4902))
            ThreePointArc((-6.416408329, -10.4902), (-7.41473083, -9.822813117), (-7.179650497, -8.645192506))
        make_face()
        Circle(SKETCH1_R, mode=Mode.SUBTRACT)
    extrude(amount=BOSS_EXTRUDE1_DEPTH, both=True)

    # Sketch2 → Cut-Extrude1 (cut, two sides)
    with BuildSketch(Plane(origin=(12.7, 0, 0), x_dir=(0, 0, -1), z_dir=(1, 0, 0))) as cut_extrude1_sk:
        with Locations((219.834861418, -0.164612138)):
            Rectangle(SKETCH2_W, SKETCH2_H)
        with Locations((-297.347005301, -0.441133996)):
            Rectangle(SKETCH2_W_2, SKETCH2_H_2)
    extrude(amount=CUT_EXTRUDE1_DEPTH, mode=Mode.SUBTRACT)
    extrude(cut_extrude1_sk.sketch, amount=-CUT_EXTRUDE1_DEPTH_BACK, mode=Mode.SUBTRACT)


solid = part.part
